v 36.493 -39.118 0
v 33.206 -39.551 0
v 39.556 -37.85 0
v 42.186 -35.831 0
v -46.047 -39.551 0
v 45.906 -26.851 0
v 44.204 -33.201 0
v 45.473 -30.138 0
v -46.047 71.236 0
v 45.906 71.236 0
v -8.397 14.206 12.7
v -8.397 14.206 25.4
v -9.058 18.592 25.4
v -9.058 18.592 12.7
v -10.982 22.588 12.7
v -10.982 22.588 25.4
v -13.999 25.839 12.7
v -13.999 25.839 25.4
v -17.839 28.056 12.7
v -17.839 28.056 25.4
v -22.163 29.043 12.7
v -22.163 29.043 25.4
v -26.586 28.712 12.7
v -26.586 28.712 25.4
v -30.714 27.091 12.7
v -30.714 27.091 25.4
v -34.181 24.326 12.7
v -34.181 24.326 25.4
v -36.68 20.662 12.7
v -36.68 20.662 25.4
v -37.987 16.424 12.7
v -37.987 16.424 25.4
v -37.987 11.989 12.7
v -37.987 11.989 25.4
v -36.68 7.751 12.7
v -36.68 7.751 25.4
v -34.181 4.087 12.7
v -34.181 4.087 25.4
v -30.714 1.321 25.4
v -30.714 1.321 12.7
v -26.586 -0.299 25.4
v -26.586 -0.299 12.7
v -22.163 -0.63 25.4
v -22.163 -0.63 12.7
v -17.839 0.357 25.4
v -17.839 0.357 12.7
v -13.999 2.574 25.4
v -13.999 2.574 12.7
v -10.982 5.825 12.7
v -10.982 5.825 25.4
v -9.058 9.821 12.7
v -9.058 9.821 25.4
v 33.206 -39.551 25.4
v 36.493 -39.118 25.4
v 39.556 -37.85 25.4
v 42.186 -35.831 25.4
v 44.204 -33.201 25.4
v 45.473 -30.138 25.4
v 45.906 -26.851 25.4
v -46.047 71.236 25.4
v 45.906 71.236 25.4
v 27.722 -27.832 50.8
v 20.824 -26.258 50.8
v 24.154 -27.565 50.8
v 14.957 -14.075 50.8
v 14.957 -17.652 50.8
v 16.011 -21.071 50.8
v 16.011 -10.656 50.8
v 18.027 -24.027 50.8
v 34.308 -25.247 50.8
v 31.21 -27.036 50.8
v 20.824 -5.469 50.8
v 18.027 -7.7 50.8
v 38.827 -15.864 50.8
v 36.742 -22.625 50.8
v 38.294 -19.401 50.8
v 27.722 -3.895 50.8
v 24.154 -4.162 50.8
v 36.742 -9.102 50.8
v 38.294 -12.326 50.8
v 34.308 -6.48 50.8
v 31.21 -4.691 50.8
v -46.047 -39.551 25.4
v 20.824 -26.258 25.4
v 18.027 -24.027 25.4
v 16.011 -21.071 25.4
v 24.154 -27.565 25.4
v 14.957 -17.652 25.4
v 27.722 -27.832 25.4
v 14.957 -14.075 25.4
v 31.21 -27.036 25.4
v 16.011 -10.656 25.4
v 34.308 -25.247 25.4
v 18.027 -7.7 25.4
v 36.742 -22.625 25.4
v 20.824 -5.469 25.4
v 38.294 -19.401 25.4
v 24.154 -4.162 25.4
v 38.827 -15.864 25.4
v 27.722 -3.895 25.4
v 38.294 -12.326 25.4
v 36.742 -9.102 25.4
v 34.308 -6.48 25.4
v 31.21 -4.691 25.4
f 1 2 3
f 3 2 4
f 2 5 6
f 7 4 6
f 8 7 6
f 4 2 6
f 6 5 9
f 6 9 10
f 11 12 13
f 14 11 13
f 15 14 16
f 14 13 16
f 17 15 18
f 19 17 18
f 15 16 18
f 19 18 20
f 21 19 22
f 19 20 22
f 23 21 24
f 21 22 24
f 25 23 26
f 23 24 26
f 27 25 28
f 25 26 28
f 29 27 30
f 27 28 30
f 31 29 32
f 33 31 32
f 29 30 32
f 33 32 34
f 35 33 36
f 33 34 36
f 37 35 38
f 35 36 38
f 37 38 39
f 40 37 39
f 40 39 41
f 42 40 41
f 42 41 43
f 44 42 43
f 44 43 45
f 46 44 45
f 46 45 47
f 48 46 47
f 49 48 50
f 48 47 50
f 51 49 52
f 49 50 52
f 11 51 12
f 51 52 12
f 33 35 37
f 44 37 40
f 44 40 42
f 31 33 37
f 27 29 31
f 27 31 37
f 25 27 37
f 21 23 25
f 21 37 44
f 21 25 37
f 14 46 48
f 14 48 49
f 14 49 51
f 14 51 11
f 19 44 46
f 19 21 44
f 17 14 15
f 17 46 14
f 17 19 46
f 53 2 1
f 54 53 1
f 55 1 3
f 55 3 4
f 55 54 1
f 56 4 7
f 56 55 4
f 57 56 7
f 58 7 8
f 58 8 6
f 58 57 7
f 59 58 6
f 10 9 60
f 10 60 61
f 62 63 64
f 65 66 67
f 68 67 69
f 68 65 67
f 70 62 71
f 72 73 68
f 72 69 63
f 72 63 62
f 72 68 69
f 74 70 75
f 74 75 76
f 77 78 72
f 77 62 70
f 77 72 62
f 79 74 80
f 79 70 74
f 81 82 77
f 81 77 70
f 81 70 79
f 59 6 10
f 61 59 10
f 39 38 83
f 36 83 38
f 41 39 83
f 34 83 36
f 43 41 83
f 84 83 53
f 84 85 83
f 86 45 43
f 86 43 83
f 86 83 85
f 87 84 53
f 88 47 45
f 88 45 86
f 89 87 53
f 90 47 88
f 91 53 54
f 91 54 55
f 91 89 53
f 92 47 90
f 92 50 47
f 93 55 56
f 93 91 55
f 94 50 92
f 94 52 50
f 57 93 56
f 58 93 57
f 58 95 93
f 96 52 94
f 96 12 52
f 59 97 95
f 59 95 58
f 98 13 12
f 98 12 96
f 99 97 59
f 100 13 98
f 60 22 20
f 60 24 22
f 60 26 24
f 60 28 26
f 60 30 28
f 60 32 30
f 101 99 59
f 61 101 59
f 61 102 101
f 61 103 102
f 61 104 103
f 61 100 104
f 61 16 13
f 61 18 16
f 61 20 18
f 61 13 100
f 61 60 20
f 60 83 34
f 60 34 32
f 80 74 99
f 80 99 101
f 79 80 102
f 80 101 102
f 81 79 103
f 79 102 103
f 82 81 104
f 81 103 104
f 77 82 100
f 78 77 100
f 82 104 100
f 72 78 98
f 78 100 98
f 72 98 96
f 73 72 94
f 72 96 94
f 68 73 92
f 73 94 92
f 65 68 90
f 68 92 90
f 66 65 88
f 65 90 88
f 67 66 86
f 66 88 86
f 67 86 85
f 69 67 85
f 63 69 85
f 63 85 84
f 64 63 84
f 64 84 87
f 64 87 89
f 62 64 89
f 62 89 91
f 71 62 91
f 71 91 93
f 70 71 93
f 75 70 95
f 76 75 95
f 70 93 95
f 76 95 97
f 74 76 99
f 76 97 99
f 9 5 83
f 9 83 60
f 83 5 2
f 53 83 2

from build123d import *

# Parameters (mm, degrees)
F0_W     = 91.952633
F0_H     = 110.787436
F1_DEPTH = 25.4
F2_R     = 12.7
F3_R     = 12.002281
F4_DEPTH = 25.4
F5_R     = 14.878246
F6_DEPTH = 12.7


with BuildPart() as f1:
    # F0 (on Top) → F1 (new body)
    with BuildSketch(Plane.XY):
        with Locations((-0.07054, 15.842587)):
            Rectangle(F0_W, F0_H)
    extrude(amount=F1_DEPTH)

    # F2
    f2_edges = [f1.edges().sort_by_distance(p)[0] for p in [
        (45.905776, -39.551131, 12.7),
    ]]
    fillet(f2_edges, radius=F2_R)

    # F3 (on face) → F4 (join)
    with BuildSketch(Plane.XY.offset(25.4)):
        with Locations((26.824998, -15.86362)):
            Circle(F3_R)
    extrude(amount=F4_DEPTH)

    # F5 (on face) → F6 (cut)
    with BuildSketch(Plane.XY.offset(25.4)):
        with Locations((-23.274958, 14.206306)):
            Circle(F5_R)
    extrude(amount=-F6_DEPTH, mode=Mode.SUBTRACT)


solid = f1.part
